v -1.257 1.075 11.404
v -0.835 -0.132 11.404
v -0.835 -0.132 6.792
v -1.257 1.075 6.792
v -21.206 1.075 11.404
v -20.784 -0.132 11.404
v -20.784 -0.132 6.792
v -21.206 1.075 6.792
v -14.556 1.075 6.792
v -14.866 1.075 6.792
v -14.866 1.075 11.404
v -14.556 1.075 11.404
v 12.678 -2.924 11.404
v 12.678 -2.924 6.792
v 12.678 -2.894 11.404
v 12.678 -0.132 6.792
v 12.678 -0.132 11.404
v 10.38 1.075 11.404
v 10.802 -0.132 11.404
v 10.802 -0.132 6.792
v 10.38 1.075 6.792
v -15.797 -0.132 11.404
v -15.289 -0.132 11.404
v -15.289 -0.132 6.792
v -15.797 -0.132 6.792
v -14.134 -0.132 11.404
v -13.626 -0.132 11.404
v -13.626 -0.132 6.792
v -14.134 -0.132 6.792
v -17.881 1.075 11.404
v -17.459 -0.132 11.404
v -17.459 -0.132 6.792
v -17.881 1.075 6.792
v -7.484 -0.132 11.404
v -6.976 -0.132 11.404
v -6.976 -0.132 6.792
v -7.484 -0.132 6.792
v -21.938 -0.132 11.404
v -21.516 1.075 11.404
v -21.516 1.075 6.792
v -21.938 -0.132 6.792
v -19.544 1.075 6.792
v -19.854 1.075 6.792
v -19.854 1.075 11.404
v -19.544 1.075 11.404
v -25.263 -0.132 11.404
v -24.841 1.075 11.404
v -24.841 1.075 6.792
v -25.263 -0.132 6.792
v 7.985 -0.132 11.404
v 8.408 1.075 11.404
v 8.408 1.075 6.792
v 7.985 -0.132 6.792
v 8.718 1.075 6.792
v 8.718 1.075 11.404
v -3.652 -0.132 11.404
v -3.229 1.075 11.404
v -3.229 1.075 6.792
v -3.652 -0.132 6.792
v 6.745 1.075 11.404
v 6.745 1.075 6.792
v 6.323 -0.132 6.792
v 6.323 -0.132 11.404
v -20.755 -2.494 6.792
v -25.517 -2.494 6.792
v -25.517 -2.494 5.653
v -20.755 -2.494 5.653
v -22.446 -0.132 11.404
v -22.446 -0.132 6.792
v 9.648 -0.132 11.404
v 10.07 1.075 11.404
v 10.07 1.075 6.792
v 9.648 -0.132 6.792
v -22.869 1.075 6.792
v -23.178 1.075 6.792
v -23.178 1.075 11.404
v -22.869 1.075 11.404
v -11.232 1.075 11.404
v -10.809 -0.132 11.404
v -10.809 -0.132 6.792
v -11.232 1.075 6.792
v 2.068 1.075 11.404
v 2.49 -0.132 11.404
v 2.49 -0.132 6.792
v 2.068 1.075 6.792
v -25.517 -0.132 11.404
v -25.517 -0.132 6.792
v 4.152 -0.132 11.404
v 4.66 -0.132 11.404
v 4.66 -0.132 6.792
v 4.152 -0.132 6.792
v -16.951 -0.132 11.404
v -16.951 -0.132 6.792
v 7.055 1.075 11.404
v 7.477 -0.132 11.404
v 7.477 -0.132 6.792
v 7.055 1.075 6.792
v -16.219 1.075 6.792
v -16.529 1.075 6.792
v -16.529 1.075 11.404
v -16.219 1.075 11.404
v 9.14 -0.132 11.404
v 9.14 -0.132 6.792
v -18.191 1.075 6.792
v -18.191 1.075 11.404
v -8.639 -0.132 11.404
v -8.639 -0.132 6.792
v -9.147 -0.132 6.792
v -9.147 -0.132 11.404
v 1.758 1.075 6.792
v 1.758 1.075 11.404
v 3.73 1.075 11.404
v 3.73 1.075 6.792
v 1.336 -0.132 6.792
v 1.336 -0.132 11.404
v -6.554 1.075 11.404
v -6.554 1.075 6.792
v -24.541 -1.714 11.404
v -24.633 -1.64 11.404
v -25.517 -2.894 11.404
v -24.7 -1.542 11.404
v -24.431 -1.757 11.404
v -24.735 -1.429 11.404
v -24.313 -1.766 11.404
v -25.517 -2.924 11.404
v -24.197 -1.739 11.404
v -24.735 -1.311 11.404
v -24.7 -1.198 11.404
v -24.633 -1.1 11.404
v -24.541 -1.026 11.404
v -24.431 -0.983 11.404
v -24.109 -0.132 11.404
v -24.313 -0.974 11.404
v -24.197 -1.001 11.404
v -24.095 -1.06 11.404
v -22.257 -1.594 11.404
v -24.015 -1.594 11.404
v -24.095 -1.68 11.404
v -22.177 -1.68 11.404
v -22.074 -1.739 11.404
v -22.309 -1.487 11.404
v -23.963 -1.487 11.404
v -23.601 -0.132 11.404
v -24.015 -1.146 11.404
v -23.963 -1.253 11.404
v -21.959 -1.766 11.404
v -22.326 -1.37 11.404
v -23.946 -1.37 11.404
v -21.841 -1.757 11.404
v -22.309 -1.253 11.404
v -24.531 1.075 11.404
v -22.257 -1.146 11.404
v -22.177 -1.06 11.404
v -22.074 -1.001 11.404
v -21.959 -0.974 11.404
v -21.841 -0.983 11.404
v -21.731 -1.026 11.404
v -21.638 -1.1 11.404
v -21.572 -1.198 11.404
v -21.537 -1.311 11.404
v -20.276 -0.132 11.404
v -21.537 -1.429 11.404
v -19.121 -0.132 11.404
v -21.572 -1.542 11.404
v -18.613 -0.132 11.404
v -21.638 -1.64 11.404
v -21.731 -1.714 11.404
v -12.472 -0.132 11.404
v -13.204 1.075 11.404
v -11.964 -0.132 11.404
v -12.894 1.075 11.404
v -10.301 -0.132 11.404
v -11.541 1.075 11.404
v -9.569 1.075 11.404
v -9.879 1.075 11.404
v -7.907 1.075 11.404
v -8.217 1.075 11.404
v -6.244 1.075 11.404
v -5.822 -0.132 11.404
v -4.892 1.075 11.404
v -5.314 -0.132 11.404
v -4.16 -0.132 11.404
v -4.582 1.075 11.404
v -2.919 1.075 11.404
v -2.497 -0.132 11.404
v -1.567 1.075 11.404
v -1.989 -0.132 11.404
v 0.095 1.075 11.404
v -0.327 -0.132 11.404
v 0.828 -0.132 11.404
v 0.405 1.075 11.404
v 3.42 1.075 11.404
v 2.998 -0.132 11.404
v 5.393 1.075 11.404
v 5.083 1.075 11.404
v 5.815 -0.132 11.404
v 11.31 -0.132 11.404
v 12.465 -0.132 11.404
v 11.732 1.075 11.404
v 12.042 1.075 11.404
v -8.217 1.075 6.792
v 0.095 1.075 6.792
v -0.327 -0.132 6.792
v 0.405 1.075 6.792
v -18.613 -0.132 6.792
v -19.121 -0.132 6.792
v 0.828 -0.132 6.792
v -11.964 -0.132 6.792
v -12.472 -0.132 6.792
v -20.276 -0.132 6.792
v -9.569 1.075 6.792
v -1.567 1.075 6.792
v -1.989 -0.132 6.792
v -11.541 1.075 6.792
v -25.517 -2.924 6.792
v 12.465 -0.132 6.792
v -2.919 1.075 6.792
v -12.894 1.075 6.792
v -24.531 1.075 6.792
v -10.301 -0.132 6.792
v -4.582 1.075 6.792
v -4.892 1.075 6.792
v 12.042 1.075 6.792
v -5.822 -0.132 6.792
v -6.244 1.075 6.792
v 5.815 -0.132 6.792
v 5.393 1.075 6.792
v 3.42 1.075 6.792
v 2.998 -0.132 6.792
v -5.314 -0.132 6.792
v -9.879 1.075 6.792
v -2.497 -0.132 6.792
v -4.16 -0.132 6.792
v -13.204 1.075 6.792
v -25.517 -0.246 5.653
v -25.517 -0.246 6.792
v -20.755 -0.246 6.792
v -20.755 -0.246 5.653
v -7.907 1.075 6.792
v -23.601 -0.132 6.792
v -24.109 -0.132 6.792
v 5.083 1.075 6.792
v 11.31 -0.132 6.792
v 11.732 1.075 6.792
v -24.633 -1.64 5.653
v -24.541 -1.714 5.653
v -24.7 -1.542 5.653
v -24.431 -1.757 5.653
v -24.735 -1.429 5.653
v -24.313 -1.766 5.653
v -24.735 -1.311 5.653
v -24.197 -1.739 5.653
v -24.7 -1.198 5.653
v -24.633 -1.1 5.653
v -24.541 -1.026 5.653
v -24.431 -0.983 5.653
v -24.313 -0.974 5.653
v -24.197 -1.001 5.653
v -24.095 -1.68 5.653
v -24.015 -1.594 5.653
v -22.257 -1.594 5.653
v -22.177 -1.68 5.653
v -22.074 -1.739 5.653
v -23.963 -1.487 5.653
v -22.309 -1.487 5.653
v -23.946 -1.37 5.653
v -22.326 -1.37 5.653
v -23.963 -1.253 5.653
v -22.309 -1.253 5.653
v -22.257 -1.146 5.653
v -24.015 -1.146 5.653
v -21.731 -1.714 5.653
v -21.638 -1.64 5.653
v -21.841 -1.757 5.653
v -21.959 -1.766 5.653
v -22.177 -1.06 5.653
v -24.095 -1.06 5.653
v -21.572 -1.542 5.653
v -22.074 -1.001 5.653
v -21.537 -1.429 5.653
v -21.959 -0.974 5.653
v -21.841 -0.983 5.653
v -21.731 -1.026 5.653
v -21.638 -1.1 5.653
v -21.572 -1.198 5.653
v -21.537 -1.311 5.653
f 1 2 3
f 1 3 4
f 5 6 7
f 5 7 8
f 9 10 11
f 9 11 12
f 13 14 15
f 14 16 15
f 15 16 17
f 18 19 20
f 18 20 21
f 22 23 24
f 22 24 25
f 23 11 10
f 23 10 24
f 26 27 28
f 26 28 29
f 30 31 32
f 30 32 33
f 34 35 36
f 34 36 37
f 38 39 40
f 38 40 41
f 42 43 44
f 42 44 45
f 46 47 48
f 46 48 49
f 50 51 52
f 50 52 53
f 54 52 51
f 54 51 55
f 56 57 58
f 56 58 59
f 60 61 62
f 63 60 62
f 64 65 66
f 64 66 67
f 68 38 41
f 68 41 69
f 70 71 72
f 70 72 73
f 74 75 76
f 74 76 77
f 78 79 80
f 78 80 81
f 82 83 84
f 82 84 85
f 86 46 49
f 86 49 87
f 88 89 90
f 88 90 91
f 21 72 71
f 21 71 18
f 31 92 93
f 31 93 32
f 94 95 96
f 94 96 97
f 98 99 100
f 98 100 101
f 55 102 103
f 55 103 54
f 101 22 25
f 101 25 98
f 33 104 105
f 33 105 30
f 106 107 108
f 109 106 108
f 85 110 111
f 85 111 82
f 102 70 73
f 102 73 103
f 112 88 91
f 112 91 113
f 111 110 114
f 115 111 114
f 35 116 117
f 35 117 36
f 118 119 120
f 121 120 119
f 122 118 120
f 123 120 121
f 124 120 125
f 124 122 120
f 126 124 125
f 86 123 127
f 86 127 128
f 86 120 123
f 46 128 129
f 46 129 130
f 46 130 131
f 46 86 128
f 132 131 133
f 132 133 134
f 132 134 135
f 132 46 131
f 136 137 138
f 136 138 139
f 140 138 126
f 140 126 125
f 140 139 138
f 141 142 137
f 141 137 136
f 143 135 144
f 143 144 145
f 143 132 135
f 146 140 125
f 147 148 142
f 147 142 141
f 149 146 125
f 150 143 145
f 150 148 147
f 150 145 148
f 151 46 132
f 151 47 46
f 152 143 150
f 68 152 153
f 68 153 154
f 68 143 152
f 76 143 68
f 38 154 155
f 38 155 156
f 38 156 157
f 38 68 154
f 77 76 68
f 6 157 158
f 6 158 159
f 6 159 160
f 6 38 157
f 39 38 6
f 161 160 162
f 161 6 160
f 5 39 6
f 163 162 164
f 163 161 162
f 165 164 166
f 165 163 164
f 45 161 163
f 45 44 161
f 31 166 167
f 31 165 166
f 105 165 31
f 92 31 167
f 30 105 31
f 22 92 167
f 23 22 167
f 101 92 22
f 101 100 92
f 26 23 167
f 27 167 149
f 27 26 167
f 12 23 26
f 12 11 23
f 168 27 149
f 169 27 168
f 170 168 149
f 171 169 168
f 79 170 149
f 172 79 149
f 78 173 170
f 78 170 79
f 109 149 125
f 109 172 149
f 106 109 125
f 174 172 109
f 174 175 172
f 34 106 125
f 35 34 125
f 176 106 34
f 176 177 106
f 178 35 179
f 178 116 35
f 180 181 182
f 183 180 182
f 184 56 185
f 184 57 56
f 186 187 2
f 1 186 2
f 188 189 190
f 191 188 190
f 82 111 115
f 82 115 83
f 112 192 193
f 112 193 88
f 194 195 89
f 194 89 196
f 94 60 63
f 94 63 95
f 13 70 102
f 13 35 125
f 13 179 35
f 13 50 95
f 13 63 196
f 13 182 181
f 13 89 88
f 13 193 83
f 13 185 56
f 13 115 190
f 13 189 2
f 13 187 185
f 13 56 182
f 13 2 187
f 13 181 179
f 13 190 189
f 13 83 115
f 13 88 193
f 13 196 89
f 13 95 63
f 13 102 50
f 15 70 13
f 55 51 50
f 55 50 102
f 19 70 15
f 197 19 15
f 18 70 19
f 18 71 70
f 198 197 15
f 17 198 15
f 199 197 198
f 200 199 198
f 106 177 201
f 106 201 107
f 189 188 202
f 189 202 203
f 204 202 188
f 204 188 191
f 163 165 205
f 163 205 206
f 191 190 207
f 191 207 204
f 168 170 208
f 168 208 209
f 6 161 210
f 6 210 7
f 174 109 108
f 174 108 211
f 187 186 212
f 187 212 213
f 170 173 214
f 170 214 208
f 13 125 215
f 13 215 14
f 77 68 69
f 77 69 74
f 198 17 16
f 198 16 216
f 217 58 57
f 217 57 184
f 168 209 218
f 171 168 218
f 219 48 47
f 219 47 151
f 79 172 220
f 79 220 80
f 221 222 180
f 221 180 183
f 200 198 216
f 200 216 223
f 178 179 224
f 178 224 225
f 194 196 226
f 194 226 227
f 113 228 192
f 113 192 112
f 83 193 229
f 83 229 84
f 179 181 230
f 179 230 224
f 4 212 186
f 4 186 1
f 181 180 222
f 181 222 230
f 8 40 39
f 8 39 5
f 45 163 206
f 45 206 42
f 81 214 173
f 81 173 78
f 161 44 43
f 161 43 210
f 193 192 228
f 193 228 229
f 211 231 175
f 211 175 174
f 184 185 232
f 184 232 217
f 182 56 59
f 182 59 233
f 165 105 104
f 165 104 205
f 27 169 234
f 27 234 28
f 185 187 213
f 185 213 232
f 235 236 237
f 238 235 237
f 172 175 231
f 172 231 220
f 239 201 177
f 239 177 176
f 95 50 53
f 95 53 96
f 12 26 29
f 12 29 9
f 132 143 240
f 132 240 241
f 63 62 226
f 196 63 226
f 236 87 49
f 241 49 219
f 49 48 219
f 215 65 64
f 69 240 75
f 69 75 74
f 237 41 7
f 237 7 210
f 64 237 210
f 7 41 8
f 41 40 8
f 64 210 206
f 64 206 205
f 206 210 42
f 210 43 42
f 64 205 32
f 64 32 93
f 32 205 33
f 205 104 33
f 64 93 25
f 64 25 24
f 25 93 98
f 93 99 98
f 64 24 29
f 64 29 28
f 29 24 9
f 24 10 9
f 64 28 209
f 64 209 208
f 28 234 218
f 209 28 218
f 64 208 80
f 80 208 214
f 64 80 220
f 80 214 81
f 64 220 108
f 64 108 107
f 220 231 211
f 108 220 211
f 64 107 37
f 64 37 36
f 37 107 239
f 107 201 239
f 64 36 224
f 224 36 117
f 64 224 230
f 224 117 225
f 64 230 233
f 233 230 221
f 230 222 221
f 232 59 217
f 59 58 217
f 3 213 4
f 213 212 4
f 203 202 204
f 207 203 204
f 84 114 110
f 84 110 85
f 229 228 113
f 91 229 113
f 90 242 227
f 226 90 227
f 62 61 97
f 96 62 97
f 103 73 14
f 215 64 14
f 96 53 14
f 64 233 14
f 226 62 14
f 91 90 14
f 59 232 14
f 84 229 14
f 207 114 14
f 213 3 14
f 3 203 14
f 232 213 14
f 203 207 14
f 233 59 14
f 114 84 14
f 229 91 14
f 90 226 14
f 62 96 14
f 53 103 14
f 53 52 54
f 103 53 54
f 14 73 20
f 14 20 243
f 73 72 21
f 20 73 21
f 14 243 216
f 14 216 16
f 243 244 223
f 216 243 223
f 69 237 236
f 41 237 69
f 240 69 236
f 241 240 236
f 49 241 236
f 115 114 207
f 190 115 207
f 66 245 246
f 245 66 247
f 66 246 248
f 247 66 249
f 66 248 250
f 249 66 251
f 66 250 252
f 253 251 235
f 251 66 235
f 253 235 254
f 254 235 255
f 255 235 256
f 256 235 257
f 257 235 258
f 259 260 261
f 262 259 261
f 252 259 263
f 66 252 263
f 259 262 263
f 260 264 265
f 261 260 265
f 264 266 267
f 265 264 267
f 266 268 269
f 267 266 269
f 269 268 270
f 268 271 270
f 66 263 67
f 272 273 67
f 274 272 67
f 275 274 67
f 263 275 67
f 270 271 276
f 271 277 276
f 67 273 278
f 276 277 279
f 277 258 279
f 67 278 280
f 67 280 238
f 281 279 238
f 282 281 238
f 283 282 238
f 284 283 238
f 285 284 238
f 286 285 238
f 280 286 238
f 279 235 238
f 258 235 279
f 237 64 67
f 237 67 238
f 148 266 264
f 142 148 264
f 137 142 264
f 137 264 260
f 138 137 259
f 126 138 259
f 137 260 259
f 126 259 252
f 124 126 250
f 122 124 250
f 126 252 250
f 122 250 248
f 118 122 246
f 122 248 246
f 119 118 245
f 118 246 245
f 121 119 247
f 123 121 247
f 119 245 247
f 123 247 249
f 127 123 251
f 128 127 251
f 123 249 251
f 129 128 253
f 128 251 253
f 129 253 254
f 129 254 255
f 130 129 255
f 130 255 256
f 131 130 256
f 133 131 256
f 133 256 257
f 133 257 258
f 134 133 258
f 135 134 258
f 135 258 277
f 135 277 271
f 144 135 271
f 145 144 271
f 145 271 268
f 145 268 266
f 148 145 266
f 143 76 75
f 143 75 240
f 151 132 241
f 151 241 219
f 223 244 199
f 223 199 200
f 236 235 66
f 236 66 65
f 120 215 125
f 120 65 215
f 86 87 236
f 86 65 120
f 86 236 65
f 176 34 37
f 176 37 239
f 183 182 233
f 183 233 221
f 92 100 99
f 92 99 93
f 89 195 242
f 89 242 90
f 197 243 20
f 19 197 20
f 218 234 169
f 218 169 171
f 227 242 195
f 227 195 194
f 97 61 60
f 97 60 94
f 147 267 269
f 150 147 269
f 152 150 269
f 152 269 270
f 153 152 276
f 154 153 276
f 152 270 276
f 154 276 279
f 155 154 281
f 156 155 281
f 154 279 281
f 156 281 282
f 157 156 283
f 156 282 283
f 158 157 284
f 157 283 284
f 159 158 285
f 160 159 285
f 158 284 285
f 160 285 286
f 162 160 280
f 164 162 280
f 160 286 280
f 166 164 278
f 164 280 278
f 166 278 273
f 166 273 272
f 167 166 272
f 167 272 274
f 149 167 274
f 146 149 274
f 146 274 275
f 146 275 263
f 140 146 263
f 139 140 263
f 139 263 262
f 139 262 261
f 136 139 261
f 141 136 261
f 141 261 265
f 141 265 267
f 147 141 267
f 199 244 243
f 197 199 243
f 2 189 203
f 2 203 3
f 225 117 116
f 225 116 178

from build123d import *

# Parameters (mm, degrees)
CROQUIS1_W              = 199.517
CROQUIS1_H              = 15.875
SALIENTE_EXTRUIR1_DEPTH = 18.445999938
CORTAR_EXTRUIR3_DEPTH   = 102.759604668
MATRIZL1_COUNT          = 32
MATRIZL1_PITCH          = 6.649704506
CROQUIS5_W              = 19.05
CROQUIS5_H              = 8.992
SALIENTE_EXTRUIR2_DEPTH = 23.00199997
CROQUIS6_R              = 1.5875
CORTAR_EXTRUIR4_DEPTH   = 103.683271428
ESCALA1_SCALE           = 0.25
CROQUIS7_R              = 4.213965504
CORTAR_EXTRUIR5_DEPTH   = 11.684
CROQUIS8_W              = 38.19525
CROQUIS8_H              = 4.611499984
SALIENTE_EXTRUIR3_DEPTH = 0.03


with BuildPart() as part:
    # Croquis1 → Saliente-Extruir1 (new body)
    with BuildSketch(Plane.XY):
        Rectangle(CROQUIS1_W, CROQUIS1_H)
    extrude(amount=SALIENTE_EXTRUIR1_DEPTH)

    # Croquis4 → Cortar-Extruir3 (cut, through all)
    with BuildSketch(Plane.XY.offset(18.445999938)):
        Polygon((-98.7425, 3.1115), (-100.7745, 3.1115), (-102.4636, 7.9375), (-97.0534, 7.9375), align=None)
    cortar_extruir3 = extrude(amount=-CORTAR_EXTRUIR3_DEPTH, mode=Mode.SUBTRACT)

    # MatrizL1: Cortar-Extruir3 ×32
    with Locations(*[(i * MATRIZL1_PITCH, 0, 0) for i in range(1, MATRIZL1_COUNT)]):
        add(cortar_extruir3, mode=Mode.SUBTRACT)

    # Croquis5 → Saliente-Extruir2 (add)
    with BuildSketch(Plane.XY.offset(18.445999938)):
        with Locations((-90.2335, -1.8415)):
            Rectangle(CROQUIS5_W, CROQUIS5_H)
    extrude(amount=-SALIENTE_EXTRUIR2_DEPTH)

    # Croquis6 → Cortar-Extruir4 (cut, through all)
    with BuildSketch(Plane(origin=(0, 0, -4.556000032), x_dir=(-1, 0, 0), z_dir=(0, 0, -1))):
        with Locations((85.4075, -1.8415)):
            Circle(CROQUIS6_R)
        with Locations(Location((95.0595, -1.8415, 0), (0, 0, 180))):
            Circle(CROQUIS6_R)
    extrude(amount=-CORTAR_EXTRUIR4_DEPTH, mode=Mode.SUBTRACT)


with BuildPart() as part_1:
    # Escala1: scaled about (-0.770061652, -1.212816099, 9.056417428)
    add(part.part.scale(ESCALA1_SCALE).moved(Location((-0.577546239, -0.909612074, 6.792313071))))

    # Croquis7 → Cortar-Extruir5 (cut)
    with BuildSketch(Plane(origin=(24.362078761, 0, 0), x_dir=(0, 0, -1), z_dir=(1, 0, 0))):
        with Locations((-9.112278758, -1.455704097)):
            Circle(CROQUIS7_R)
    extrude(amount=-CORTAR_EXTRUIR5_DEPTH, mode=Mode.SUBTRACT)

    # Croquis8 → Saliente-Extruir3 (add)
    with BuildSketch(Plane.XZ.offset(2.893987074)):
        with Locations((-6.419546239, 9.098063063)):
            Rectangle(CROQUIS8_W, CROQUIS8_H)
    extrude(amount=SALIENTE_EXTRUIR3_DEPTH)


solid = part_1.part
